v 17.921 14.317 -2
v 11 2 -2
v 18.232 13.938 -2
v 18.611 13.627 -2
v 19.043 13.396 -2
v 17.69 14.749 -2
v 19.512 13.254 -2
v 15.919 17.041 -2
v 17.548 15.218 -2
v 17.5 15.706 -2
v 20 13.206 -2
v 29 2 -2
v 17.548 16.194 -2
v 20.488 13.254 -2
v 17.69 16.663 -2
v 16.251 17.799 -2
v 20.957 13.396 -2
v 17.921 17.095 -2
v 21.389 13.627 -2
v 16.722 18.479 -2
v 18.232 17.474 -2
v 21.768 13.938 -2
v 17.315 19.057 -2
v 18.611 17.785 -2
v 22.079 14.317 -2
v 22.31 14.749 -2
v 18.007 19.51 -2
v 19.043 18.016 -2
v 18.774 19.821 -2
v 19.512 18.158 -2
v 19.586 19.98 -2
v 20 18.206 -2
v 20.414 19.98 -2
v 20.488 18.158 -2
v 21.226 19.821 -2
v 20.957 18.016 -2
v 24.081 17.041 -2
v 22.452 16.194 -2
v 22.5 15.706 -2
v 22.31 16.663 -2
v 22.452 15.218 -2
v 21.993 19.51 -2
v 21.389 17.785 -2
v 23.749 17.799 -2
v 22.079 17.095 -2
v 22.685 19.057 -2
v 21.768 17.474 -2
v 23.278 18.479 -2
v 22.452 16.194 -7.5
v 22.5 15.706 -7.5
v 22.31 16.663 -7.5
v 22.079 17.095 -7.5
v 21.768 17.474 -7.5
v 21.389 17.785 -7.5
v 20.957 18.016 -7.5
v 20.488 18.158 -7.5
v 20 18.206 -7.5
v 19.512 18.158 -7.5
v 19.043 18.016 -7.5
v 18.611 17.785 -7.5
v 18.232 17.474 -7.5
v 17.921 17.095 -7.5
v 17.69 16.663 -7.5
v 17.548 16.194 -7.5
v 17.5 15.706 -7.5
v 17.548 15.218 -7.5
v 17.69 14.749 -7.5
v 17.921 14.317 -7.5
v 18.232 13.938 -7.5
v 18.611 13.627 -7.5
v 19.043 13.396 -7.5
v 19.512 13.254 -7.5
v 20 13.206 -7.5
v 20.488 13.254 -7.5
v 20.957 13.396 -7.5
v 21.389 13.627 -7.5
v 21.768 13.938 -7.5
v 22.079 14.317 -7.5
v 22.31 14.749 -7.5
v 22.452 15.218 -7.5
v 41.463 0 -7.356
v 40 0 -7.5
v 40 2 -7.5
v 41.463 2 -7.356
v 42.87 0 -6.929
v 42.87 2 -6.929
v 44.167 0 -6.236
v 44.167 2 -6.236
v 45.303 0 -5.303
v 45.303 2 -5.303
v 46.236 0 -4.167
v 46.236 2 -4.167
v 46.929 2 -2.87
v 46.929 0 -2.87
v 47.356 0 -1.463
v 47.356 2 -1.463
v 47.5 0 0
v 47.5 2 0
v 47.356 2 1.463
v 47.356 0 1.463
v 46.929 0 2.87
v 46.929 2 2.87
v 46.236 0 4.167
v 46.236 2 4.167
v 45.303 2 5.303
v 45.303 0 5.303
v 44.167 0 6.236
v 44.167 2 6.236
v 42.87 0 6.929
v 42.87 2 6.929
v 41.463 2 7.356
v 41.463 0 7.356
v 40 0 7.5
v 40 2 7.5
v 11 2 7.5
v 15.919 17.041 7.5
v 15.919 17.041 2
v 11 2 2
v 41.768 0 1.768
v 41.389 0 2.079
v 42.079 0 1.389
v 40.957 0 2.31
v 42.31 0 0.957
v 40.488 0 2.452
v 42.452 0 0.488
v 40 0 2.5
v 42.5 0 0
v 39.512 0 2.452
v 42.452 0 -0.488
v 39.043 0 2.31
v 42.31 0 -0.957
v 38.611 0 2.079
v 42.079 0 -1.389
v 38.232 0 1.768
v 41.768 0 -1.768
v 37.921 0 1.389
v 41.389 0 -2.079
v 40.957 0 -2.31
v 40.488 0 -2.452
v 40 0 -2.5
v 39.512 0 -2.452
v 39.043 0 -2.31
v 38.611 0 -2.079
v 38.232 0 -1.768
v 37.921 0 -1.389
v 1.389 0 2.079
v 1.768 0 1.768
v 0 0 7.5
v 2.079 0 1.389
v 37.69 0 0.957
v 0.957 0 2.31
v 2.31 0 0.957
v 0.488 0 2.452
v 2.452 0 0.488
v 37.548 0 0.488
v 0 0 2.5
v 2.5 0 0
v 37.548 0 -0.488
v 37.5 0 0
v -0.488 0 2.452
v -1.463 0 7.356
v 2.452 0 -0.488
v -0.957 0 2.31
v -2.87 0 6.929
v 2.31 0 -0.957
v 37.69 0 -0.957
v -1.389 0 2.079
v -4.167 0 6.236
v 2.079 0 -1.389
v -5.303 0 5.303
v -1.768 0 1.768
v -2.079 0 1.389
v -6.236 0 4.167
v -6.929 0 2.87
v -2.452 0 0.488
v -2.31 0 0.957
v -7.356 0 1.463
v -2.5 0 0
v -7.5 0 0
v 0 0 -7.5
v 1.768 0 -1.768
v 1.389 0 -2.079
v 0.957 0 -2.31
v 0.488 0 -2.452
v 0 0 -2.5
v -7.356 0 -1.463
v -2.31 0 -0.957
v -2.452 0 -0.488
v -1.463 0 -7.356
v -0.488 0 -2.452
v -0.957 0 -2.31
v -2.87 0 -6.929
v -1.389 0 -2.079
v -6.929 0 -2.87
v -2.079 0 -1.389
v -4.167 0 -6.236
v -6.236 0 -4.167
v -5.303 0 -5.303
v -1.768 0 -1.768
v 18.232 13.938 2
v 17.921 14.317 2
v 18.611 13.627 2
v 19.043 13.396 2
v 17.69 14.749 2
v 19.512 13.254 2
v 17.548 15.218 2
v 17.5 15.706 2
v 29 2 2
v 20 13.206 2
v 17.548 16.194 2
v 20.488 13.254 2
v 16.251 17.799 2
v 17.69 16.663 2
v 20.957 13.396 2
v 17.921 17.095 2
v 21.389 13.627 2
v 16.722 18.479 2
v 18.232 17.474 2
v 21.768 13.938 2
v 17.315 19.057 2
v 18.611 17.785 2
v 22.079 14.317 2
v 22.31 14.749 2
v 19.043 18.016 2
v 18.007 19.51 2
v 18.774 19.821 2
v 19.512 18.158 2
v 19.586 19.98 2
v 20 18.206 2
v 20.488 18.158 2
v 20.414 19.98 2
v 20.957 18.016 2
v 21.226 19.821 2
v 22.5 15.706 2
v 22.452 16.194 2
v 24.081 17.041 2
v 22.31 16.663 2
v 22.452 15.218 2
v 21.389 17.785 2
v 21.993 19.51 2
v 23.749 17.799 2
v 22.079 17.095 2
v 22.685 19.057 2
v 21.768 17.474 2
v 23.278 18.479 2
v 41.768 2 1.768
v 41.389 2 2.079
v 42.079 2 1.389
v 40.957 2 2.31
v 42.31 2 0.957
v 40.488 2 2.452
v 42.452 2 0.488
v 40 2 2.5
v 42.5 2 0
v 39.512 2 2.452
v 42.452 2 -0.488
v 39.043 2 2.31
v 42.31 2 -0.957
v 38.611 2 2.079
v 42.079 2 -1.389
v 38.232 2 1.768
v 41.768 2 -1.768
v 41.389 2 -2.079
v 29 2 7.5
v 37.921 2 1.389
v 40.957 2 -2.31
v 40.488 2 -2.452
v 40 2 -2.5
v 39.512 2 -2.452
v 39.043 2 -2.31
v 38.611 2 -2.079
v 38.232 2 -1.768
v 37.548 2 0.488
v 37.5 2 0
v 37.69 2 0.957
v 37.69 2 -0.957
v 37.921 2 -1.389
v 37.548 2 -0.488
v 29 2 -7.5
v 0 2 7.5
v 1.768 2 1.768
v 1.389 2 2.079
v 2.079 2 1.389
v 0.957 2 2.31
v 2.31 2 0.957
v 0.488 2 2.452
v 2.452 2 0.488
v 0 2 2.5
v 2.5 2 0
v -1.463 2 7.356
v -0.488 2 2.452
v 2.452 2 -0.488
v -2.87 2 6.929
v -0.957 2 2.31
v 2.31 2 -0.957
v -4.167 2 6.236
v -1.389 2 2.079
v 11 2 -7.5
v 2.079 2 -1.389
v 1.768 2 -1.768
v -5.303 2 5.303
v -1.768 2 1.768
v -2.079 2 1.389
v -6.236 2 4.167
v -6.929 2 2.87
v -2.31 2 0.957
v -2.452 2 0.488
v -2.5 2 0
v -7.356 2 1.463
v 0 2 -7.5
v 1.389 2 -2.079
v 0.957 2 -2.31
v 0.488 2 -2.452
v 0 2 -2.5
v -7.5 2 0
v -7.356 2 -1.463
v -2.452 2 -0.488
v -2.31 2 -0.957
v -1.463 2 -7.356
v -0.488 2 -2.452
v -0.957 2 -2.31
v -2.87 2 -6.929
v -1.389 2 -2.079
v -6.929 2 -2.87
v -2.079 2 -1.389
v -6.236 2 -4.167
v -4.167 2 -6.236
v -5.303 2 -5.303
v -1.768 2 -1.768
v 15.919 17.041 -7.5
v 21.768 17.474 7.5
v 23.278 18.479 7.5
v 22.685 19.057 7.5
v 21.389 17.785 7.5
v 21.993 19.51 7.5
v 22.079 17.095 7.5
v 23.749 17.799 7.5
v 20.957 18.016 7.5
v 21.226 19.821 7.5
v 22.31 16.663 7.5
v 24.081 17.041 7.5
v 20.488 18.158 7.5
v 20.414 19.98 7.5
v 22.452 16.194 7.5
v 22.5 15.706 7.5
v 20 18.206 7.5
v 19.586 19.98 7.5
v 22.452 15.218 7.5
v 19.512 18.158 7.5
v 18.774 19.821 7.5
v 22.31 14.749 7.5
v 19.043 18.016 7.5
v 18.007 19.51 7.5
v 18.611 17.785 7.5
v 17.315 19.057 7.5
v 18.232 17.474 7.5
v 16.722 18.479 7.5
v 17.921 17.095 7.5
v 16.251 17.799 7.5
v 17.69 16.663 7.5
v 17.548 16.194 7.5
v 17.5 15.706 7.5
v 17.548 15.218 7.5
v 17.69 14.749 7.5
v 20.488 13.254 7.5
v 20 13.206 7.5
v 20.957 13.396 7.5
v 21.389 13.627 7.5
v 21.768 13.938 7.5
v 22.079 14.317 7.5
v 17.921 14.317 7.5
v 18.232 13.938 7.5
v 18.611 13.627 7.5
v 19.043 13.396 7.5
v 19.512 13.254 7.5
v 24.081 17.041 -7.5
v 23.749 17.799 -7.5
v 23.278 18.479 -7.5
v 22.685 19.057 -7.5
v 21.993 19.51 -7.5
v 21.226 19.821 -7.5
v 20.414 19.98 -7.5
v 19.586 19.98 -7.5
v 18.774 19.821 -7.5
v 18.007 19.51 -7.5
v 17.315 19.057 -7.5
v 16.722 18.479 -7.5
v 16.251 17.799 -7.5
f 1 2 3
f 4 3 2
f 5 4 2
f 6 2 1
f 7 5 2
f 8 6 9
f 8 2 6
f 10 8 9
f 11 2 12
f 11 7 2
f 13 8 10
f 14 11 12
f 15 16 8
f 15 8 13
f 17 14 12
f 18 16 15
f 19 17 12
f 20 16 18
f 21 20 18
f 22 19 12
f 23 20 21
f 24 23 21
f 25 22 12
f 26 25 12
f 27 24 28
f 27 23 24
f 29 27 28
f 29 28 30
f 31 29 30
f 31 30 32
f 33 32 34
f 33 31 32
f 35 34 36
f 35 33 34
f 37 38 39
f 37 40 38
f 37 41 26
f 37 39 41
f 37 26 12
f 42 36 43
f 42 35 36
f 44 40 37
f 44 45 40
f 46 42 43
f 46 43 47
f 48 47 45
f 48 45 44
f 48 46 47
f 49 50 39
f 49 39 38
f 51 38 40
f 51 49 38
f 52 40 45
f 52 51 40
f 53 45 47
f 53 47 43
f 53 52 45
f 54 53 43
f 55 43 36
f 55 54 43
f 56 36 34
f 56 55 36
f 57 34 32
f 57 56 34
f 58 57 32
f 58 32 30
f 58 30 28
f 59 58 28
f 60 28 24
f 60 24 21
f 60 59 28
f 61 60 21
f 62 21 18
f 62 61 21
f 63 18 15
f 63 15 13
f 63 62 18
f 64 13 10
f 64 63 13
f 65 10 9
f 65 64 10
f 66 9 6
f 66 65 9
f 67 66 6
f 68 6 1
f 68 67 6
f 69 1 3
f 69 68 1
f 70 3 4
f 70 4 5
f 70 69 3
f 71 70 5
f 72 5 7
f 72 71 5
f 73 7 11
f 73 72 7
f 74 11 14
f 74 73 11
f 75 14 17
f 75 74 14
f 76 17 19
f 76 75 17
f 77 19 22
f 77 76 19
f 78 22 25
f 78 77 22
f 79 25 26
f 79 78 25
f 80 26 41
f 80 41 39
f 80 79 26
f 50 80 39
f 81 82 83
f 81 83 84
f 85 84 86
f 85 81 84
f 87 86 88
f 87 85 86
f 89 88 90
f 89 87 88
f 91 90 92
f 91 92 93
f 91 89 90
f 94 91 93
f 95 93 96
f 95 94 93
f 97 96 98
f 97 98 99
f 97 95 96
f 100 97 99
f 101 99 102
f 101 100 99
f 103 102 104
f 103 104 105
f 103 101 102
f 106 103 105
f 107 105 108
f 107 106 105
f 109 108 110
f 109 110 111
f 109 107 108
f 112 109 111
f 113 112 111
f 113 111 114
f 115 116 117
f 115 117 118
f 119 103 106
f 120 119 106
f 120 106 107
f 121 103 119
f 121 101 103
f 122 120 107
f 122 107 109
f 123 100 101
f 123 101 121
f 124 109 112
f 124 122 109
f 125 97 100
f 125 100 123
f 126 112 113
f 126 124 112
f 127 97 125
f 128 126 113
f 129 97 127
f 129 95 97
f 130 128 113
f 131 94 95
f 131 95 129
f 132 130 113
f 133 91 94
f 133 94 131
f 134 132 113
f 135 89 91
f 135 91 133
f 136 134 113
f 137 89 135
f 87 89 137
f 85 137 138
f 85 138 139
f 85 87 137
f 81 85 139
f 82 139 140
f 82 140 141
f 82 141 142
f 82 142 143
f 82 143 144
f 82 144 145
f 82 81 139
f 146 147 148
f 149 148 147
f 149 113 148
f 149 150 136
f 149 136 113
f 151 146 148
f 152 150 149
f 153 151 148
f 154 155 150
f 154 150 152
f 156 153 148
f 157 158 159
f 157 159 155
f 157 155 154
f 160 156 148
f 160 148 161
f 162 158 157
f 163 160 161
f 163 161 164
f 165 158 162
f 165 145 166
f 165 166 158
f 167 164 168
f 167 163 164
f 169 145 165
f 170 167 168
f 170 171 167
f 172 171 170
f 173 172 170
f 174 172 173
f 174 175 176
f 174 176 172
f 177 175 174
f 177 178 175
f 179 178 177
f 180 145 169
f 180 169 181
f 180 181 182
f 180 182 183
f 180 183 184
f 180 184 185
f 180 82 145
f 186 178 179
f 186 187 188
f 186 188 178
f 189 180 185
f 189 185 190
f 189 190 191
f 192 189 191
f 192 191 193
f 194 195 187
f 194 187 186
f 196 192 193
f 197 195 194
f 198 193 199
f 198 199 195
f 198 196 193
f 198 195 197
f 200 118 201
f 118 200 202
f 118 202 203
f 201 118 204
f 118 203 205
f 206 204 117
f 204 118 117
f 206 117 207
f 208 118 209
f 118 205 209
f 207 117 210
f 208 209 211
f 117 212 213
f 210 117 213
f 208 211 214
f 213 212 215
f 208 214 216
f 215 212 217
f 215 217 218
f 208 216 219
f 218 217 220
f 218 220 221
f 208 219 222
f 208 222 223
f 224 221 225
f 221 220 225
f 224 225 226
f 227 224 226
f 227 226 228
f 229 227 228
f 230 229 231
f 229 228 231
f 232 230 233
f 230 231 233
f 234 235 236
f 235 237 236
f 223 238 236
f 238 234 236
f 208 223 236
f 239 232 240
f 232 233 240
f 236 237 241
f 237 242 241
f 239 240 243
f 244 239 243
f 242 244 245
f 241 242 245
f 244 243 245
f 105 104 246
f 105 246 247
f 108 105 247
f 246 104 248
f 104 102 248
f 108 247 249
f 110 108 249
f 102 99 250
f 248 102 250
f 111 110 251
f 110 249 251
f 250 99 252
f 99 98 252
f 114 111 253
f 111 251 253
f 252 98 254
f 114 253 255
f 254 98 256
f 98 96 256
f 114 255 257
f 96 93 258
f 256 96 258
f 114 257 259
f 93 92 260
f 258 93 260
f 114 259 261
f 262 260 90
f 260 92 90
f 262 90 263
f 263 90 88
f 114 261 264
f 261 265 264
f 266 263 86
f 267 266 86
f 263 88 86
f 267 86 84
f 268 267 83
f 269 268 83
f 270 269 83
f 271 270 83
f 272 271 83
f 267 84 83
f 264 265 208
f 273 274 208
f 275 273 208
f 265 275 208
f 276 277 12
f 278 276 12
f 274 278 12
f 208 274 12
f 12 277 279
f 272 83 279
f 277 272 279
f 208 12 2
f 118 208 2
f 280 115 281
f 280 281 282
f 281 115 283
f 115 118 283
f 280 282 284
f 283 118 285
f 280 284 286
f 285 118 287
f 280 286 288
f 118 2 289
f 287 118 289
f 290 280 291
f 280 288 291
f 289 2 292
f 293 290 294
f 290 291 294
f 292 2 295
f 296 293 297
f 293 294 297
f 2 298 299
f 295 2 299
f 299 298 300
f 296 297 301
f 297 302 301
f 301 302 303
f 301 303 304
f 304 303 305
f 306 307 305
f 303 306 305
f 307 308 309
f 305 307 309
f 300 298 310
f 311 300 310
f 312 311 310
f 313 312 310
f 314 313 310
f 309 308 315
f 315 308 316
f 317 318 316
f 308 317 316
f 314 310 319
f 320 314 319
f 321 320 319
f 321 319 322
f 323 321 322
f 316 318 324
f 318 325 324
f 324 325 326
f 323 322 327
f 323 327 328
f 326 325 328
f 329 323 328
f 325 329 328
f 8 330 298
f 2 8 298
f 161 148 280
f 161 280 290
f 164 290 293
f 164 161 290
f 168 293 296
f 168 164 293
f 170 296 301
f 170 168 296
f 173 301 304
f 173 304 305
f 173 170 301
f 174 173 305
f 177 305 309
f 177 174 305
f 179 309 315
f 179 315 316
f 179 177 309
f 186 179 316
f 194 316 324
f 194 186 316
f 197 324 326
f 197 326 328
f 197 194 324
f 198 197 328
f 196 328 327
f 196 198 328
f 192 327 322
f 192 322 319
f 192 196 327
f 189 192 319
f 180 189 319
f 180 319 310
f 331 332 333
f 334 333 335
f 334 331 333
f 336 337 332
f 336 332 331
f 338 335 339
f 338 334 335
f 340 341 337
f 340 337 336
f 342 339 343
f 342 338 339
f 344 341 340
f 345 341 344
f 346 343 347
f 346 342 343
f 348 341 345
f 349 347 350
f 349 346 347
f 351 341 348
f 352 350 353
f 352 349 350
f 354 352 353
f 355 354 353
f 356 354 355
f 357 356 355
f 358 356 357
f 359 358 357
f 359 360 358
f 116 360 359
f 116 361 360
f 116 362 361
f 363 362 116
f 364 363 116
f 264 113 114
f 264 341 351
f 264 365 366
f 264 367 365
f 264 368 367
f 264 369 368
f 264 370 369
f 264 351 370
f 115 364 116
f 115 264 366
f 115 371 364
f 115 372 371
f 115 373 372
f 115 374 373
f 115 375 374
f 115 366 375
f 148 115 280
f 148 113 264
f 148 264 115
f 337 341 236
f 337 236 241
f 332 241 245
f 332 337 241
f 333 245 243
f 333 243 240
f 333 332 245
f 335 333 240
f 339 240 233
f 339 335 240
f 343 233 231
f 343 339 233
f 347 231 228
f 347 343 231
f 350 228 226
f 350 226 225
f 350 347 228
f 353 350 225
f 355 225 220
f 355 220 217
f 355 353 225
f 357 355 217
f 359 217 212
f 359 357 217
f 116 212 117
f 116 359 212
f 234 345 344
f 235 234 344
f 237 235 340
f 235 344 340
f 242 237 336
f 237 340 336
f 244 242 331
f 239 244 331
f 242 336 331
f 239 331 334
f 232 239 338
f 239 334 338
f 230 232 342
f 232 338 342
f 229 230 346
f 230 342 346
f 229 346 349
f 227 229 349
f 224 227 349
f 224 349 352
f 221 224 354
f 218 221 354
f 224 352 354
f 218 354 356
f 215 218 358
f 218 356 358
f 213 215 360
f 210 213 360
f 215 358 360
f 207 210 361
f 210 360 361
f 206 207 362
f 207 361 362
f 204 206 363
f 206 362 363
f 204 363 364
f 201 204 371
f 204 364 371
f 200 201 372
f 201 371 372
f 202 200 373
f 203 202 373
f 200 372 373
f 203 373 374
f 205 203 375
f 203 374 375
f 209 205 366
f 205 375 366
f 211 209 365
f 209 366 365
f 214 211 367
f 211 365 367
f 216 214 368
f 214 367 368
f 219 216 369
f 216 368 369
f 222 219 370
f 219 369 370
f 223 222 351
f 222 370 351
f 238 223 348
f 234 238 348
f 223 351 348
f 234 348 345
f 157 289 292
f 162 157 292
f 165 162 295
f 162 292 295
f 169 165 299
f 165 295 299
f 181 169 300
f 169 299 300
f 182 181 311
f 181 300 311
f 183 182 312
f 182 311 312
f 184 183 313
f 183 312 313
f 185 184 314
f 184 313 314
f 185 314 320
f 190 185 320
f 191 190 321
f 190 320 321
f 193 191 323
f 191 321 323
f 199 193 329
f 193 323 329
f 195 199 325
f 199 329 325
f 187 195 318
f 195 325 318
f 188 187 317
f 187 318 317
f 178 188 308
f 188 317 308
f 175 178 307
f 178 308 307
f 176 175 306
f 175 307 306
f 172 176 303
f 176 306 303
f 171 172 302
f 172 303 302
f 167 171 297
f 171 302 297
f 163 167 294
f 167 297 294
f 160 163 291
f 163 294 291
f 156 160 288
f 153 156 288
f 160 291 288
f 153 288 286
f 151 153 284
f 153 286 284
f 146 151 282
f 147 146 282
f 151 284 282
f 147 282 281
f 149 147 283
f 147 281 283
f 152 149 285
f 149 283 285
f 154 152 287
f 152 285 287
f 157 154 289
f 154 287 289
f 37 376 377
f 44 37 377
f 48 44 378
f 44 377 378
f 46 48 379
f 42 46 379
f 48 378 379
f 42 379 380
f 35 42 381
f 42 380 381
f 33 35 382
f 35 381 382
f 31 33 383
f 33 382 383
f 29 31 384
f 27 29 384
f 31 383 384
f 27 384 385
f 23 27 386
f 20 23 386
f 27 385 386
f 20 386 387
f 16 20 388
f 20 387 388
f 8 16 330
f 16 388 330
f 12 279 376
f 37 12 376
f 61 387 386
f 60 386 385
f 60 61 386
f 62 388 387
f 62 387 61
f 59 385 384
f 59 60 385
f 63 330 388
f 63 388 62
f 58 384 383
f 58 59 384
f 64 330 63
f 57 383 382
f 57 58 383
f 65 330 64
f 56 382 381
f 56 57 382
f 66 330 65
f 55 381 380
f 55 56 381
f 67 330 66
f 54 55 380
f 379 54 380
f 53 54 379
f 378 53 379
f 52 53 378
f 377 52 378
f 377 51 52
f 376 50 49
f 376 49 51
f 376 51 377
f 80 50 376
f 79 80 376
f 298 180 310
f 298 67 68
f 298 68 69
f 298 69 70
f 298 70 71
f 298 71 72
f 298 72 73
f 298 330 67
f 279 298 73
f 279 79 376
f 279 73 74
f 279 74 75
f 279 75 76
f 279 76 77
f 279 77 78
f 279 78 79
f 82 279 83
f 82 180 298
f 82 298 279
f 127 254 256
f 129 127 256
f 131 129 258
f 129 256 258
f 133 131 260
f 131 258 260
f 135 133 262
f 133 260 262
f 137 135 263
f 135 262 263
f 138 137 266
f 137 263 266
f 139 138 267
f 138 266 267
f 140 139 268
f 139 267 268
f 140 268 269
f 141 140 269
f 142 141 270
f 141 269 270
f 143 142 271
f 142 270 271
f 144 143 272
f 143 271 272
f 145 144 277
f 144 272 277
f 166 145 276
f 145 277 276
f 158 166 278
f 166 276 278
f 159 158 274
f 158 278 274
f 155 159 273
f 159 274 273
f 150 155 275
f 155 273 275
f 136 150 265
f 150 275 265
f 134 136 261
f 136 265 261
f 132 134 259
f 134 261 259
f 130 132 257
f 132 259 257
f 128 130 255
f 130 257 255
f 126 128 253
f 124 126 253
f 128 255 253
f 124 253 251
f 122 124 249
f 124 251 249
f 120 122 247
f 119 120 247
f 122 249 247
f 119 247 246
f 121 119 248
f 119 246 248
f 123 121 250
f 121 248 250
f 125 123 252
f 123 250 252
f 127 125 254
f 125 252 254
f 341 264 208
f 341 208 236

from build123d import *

# Parameters (mm, degrees)
BOSS_EXTRUDE1_DEPTH = 2
SKETCH2_R           = 2.5
BOSS_EXTRUDE2_DEPTH = 5.5
SKETCH3_R           = 2.5
CUT_EXTRUDE1_DEPTH  = 2


with BuildPart() as part:
    # Sketch1 → Boss-Extrude1 (new body)
    with BuildSketch(Plane(origin=(0, 0, 0), x_dir=(1, 0, 0), z_dir=(0, 1, 0))):
        with BuildLine():
            Line((0, 7.5), (40, 7.5))
            ThreePointArc((40, 7.5), (47.5, 0), (40, -7.5))
            Line((40, -7.5), (0, -7.5))
            ThreePointArc((0, -7.5), (-7.5, 0), (0, 7.5))
        make_face()
    extrude(amount=BOSS_EXTRUDE1_DEPTH)

    # Sketch2 → Boss-Extrude2 (add)
    with BuildSketch(Plane.XY.offset(7.5)):
        with BuildLine():
            Line((15.918750874, 17.040738272), (11, 2))
            Line((11, 2), (20, 2))
            Line((20, 2), (29, 2))
            Line((29, 2), (24.081249126, 17.040738272))
            ThreePointArc((24.081249126, 17.040738272), (20, 20), (15.918750874, 17.040738272))
        make_face()
        with Locations((20, 15.706053276)):
            Circle(SKETCH2_R, mode=Mode.SUBTRACT)
    boss_extrude2 = extrude(amount=-BOSS_EXTRUDE2_DEPTH)

    # Mirror1: Boss-Extrude2 across plane
    add(boss_extrude2.mirror(Plane.XY))

    # Sketch3 → Cut-Extrude1 (cut)
    with BuildSketch(Plane(origin=(0, 2, 0), x_dir=(1, 0, 0), z_dir=(0, 1, 0))):
        Circle(SKETCH3_R)
        with Locations((40, 0)):
            Circle(SKETCH3_R)
    extrude(amount=-CUT_EXTRUDE1_DEPTH, mode=Mode.SUBTRACT)


solid = part.part
